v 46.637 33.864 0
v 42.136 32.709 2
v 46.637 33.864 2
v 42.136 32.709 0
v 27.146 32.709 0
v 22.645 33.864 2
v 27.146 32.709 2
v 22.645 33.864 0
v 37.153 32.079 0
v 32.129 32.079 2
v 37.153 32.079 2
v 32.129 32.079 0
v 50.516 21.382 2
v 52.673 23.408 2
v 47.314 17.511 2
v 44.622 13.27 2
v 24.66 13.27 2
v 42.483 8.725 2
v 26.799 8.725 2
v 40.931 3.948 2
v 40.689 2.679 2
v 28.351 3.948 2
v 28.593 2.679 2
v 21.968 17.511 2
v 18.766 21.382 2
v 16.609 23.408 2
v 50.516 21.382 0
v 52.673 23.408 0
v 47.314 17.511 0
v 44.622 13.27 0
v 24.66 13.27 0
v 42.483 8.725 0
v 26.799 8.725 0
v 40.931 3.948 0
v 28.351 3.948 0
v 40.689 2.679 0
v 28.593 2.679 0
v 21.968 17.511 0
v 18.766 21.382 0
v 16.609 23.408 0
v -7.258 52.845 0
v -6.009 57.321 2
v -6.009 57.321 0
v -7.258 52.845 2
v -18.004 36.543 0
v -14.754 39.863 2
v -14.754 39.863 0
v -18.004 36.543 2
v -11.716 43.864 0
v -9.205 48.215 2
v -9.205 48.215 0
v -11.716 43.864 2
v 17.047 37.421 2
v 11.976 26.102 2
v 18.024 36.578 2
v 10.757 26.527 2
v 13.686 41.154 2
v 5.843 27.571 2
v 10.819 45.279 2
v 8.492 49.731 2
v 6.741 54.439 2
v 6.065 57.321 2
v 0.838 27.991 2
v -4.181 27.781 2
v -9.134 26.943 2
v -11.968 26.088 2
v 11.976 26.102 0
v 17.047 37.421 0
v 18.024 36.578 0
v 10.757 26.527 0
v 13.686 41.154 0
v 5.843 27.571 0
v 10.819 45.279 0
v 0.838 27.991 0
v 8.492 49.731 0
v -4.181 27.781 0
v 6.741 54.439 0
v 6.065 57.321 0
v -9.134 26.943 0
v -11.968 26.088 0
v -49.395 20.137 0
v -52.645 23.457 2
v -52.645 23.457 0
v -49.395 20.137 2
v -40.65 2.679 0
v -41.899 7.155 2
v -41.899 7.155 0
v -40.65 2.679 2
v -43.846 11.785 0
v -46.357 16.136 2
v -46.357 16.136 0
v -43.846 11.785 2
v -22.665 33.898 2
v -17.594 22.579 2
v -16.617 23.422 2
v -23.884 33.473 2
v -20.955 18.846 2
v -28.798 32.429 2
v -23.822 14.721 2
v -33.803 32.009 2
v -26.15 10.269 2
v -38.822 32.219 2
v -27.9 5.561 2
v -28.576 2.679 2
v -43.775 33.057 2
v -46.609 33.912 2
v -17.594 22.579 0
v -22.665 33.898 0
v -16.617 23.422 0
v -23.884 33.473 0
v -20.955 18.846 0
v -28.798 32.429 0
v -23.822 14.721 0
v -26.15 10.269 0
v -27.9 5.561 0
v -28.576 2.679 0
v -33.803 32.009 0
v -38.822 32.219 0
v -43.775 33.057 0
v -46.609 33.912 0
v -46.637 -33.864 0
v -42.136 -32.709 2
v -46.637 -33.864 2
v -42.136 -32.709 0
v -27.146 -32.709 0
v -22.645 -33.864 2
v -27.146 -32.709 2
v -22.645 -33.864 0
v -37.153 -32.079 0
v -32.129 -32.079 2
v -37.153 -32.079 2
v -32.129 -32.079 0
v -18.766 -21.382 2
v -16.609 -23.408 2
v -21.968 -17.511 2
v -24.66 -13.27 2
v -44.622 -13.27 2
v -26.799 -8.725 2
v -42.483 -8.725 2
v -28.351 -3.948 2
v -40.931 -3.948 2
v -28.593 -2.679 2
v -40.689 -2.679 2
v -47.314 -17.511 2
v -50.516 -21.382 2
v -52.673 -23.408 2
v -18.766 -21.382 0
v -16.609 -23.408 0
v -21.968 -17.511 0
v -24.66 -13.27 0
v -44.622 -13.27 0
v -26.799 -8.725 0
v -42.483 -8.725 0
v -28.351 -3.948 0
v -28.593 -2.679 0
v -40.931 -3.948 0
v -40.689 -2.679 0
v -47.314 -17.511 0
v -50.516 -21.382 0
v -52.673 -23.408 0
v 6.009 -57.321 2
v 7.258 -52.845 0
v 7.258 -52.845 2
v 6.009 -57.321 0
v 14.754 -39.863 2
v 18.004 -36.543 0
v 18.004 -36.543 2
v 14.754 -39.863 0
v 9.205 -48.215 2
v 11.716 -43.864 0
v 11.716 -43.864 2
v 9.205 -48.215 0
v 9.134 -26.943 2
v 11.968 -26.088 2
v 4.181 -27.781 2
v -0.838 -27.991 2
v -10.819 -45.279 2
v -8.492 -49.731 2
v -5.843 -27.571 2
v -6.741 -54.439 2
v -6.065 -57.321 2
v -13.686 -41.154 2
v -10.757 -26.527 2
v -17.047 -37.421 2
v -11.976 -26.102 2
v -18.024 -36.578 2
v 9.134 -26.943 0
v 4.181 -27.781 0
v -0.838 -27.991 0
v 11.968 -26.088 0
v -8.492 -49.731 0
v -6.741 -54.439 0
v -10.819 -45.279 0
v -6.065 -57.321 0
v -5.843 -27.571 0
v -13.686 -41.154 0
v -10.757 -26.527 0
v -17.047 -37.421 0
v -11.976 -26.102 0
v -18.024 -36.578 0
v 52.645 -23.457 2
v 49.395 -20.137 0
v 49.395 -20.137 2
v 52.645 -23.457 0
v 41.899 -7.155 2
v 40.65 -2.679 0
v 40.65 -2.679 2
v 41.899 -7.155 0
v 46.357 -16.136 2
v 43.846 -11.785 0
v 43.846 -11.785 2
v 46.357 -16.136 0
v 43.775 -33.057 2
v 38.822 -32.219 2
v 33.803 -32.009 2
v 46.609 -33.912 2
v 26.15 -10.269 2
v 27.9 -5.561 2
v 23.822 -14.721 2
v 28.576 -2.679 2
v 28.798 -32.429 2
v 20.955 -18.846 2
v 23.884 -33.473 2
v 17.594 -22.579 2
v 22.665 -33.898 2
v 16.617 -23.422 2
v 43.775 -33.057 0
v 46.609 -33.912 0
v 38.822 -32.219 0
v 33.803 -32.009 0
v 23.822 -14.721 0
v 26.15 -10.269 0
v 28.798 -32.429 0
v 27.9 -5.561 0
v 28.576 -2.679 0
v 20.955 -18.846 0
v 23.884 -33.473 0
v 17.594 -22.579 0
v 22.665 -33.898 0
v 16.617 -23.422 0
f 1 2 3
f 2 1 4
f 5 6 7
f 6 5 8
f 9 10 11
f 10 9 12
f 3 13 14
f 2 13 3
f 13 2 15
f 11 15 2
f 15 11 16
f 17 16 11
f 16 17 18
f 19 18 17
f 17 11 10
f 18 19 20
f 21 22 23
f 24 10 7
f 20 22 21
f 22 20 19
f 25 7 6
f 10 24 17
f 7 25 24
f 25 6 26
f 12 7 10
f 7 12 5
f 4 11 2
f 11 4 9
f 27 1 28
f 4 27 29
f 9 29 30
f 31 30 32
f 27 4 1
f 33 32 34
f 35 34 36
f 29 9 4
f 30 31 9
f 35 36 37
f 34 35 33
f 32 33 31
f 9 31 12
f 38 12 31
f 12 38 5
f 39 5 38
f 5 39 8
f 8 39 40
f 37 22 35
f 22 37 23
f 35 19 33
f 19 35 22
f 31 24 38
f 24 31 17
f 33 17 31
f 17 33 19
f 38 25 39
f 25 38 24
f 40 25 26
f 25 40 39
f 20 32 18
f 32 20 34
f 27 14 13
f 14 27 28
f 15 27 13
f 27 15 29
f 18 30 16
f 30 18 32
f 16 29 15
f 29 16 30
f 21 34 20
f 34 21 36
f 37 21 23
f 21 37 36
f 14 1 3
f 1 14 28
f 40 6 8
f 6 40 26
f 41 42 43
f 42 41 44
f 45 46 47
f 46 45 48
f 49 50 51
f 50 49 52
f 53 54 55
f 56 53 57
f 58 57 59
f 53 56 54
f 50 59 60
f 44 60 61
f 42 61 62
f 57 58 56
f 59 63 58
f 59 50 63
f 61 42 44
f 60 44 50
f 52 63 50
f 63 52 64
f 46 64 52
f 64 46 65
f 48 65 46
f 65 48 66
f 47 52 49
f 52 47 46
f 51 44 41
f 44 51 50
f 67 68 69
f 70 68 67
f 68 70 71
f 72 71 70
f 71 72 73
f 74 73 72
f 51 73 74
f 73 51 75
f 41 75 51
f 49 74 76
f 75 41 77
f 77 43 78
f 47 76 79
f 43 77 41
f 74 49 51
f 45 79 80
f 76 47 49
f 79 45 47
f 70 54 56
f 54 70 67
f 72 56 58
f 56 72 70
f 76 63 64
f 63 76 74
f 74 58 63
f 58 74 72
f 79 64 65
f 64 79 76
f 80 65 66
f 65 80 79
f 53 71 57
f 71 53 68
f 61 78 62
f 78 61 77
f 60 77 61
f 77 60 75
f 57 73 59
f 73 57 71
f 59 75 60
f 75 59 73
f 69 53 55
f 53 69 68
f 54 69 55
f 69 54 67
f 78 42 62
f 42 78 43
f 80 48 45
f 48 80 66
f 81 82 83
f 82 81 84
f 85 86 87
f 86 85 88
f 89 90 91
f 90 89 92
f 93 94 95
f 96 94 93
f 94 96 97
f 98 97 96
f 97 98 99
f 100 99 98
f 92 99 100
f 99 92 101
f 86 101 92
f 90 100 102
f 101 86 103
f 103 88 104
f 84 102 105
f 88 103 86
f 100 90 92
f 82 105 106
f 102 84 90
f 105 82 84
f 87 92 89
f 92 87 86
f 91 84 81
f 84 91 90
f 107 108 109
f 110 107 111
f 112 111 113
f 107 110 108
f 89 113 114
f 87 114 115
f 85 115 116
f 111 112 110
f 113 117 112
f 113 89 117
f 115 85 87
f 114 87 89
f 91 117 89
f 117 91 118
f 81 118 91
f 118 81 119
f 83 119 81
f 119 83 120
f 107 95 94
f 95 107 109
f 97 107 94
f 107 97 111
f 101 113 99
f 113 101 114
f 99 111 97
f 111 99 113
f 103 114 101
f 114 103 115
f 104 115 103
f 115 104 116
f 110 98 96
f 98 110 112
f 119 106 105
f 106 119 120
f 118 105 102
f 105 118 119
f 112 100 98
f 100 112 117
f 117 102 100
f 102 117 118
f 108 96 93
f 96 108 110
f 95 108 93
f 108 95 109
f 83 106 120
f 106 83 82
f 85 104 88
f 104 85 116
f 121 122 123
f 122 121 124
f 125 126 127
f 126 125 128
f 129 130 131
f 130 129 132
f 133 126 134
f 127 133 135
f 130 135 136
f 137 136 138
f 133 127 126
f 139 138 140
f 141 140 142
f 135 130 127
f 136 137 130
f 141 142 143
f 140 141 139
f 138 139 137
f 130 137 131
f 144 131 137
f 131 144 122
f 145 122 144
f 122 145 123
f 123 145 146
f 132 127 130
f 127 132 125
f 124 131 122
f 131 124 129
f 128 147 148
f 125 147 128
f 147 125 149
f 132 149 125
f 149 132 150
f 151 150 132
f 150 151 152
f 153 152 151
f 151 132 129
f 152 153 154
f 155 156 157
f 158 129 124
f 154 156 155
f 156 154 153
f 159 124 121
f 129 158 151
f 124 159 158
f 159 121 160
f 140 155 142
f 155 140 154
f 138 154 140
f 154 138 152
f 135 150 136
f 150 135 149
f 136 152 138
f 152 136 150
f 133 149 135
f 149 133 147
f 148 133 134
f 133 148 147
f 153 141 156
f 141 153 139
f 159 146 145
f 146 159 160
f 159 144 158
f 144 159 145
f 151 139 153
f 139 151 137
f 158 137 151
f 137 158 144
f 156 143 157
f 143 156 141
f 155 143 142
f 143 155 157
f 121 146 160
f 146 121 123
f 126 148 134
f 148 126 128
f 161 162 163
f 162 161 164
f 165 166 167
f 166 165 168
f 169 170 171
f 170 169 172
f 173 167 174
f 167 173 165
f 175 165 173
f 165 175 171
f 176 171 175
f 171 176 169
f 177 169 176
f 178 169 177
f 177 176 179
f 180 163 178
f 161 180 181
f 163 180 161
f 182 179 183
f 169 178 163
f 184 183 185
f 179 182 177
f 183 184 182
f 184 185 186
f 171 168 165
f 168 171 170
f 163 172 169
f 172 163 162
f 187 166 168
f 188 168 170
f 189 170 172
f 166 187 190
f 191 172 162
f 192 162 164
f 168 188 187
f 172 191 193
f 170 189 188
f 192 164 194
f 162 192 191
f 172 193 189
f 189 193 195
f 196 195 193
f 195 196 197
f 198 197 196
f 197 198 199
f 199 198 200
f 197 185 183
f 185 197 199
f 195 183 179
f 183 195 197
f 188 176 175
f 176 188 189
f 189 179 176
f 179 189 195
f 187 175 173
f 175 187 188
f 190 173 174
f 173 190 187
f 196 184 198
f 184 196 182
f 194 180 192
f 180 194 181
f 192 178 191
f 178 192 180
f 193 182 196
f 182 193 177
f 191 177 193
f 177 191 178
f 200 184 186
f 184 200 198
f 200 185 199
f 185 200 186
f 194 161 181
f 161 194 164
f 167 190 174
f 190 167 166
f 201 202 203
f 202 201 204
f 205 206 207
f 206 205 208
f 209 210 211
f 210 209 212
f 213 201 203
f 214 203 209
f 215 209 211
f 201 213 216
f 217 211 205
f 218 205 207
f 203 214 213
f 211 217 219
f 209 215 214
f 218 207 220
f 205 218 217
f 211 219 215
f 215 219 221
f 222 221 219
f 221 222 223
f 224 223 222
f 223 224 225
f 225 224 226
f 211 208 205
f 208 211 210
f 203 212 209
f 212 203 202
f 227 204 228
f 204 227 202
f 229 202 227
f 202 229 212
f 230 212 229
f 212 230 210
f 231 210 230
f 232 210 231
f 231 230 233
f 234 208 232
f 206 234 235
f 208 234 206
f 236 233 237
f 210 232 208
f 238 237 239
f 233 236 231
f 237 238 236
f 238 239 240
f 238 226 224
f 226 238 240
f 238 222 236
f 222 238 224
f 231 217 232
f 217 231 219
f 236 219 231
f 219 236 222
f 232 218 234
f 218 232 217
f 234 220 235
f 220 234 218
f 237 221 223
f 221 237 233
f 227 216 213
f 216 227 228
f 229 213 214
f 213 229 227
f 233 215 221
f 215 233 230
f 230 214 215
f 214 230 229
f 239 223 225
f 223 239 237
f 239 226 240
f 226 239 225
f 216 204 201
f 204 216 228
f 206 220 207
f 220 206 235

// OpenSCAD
$fn = 50;

depth = 2;
hex_radius = 20;
radius = 40;
offset_factor = 1.3;
triad_shift = 30;
shift_armonics = [3,7,11];

circle_triad();



module circle_triad() {
for ( i = [ 30,90, 150, 210, 270,330 ] )
    translate( [radius*cos(i), radius*sin(i),0] ) rotate(i-30) triad();
}
module triad(){
difference() {
cylinder( r = hex_radius, h = depth, $fn = 6);
    for (i = shift_armonics) {
        translate([offset_factor*radius*cos(i*triad_shift), offset_factor*radius*sin(i*triad_shift),0]) cylinder(r = radius, h = depth);
    }
}
}
    /*
translate([offset_factor*radius*cos(11*triad_shift), offset_factor*radius*sin(11*triad_shift),0]) cylinder(r = radius, h = depth);
translate([offset_factor*radius*cos(3*triad_shift), offset_factor*radius*sin(3*triad_shift),0]) cylinder(r = radius, h = depth);
translate([offset_factor*radius*cos(7*triad_shift), offset_factor*radius*sin(7*triad_shift),0]) cylinder(r = radius, h = depth);
}*/
